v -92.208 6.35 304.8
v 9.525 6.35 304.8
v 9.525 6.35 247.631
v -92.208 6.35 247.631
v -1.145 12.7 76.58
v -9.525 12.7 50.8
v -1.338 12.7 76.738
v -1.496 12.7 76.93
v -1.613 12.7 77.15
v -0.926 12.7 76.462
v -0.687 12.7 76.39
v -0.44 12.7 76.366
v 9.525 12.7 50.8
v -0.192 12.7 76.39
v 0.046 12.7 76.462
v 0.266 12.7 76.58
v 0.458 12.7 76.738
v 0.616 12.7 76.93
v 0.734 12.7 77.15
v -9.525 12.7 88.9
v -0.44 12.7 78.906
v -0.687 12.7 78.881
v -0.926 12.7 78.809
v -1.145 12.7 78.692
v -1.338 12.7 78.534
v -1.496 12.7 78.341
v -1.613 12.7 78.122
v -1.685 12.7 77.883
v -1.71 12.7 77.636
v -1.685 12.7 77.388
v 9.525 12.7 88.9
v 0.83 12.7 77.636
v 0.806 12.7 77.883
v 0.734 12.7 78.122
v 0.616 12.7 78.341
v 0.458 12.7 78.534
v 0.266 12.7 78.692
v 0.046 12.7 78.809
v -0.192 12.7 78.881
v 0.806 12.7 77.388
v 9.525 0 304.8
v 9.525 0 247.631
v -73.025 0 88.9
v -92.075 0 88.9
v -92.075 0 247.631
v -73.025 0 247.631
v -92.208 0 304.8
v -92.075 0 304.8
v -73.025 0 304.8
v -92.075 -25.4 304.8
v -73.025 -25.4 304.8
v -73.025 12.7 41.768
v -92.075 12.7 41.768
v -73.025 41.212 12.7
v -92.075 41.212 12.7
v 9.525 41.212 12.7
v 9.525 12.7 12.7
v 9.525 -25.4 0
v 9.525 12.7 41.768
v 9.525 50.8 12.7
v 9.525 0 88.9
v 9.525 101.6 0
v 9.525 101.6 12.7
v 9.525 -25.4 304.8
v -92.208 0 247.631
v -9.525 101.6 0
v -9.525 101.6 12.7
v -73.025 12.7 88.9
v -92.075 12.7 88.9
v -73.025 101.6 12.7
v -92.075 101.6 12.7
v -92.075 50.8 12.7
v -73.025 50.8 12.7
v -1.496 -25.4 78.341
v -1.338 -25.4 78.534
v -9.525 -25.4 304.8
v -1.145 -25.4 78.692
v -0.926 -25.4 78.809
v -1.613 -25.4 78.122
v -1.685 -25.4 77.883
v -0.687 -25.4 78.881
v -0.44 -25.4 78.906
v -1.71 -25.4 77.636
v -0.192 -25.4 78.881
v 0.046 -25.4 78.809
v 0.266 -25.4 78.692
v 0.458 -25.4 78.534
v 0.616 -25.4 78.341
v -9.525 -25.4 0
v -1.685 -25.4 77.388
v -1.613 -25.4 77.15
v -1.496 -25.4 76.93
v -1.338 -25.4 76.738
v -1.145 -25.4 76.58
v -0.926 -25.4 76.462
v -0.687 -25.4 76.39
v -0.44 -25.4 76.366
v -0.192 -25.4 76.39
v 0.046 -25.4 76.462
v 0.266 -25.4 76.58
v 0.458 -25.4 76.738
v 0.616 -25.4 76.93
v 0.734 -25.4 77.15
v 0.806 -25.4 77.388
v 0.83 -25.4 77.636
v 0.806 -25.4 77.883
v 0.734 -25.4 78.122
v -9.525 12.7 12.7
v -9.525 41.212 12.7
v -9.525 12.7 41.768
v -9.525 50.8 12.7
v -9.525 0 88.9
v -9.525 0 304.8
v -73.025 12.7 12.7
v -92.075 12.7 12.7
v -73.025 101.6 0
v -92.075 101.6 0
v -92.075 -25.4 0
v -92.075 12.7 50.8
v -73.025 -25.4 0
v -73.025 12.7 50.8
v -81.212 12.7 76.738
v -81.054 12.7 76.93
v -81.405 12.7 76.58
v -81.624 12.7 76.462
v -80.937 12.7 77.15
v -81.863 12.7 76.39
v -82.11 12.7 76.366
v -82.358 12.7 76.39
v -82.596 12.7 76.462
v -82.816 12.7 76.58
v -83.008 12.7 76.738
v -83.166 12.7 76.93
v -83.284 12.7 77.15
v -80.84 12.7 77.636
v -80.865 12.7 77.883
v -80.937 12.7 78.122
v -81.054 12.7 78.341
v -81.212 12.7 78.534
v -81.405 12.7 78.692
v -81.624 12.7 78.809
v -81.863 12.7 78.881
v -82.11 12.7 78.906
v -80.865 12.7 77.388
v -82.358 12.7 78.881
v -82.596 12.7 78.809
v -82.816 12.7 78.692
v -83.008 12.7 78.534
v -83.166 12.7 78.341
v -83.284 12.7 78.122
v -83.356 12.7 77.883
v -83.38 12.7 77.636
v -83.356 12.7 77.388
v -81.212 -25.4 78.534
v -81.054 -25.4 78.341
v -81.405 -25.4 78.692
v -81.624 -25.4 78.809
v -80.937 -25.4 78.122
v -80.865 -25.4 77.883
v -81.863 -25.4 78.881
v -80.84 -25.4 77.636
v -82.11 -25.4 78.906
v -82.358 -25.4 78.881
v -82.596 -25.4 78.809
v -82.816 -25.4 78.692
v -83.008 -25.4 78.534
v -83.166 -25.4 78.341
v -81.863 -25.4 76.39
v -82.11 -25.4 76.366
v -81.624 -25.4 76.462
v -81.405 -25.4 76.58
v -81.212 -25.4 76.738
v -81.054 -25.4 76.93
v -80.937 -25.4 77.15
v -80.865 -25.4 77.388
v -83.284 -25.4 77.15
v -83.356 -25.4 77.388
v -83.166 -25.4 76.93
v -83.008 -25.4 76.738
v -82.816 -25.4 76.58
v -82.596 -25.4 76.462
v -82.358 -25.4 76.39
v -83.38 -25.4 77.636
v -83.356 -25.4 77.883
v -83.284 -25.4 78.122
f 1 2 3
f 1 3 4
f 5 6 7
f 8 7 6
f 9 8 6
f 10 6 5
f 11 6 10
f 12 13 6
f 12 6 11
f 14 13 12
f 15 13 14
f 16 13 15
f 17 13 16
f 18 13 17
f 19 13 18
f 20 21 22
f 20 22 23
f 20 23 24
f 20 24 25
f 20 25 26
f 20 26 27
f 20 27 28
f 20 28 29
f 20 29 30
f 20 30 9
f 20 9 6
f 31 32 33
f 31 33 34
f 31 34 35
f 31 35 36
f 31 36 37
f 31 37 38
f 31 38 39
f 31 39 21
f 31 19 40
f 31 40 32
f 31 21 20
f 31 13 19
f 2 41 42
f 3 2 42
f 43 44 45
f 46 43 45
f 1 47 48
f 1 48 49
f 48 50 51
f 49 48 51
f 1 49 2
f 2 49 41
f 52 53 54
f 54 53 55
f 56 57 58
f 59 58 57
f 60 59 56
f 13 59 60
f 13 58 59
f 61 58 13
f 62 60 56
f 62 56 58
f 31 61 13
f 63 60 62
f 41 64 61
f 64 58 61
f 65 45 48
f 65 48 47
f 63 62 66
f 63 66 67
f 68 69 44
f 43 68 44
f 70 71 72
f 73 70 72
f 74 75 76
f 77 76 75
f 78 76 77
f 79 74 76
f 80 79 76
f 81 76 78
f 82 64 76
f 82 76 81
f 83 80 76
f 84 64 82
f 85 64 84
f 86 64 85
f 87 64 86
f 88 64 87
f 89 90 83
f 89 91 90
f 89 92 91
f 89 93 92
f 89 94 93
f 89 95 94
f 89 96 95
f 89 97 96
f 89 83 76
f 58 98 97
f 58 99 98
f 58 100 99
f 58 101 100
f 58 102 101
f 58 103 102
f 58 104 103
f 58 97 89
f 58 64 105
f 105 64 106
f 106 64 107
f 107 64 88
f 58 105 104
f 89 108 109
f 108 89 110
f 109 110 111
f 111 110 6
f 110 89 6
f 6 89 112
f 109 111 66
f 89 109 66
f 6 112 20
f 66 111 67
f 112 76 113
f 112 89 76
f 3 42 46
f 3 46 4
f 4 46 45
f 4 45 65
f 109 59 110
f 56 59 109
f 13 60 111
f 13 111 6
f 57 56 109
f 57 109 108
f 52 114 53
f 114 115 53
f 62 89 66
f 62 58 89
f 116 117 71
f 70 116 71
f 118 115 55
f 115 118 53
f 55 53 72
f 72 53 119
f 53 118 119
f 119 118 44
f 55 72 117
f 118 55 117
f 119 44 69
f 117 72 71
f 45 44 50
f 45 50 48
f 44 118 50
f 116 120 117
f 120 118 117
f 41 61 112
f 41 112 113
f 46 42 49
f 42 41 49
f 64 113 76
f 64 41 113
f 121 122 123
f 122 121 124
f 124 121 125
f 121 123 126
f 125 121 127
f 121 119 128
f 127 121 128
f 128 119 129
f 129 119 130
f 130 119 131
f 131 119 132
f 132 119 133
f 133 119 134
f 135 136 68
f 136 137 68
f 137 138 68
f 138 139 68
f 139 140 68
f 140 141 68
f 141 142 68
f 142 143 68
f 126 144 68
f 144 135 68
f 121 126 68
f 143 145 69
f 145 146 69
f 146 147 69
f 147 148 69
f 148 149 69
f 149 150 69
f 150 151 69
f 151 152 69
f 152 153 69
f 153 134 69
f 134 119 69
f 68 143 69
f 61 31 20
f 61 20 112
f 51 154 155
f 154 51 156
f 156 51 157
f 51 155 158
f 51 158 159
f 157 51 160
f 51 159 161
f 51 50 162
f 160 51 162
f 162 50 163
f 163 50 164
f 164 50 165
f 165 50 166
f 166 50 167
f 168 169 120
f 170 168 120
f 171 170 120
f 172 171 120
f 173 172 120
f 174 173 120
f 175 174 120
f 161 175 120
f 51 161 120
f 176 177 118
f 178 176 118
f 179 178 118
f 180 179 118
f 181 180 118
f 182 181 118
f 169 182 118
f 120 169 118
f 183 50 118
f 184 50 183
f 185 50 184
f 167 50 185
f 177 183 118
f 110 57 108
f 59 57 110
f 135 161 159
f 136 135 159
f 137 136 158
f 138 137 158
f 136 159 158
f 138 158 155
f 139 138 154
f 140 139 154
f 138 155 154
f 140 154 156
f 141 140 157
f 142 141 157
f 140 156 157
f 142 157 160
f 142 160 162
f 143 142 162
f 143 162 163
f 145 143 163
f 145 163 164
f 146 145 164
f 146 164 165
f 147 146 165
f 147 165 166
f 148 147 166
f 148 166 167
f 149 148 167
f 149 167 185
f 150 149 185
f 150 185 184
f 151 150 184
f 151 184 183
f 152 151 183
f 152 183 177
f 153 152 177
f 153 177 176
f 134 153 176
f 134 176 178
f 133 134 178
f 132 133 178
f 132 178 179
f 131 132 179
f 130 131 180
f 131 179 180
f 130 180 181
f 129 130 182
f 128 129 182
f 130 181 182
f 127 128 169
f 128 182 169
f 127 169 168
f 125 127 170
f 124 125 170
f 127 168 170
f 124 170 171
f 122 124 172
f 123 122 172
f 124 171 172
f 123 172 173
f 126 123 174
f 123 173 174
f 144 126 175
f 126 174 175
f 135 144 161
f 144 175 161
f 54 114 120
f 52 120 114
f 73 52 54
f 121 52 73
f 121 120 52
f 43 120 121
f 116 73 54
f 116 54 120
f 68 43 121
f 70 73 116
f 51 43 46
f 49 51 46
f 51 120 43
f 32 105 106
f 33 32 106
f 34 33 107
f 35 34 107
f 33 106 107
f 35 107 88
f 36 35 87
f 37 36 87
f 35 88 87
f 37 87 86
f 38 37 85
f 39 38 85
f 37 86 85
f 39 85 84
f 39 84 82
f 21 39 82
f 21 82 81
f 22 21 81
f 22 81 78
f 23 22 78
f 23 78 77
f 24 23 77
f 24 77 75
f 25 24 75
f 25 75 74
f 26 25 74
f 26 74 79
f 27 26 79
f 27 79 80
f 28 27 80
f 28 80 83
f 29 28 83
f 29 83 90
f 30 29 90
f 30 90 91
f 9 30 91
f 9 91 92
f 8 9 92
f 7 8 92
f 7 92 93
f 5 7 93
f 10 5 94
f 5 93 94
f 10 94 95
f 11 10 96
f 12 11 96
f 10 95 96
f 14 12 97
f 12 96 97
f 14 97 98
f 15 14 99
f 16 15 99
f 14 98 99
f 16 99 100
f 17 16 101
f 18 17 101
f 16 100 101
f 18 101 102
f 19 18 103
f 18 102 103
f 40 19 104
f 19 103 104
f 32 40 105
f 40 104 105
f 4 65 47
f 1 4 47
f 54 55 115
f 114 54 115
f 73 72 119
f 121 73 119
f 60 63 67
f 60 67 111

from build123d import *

# Parameters (mm, degrees)
F1_DEPTH = 9.525
F5_D     = 2.54
F5_2_D   = 2.54
F6_W     = 82.682737267
F6_H     = 19.1611907959
F6_H_2   = 18.3808207512
F6_H_3   = 19.627019763
F6_W_2   = 19.05
F7_DEPTH = 6.35


with BuildPart() as f1:
    # F0 (on Right) → F1 (new body, symmetric)
    with BuildSketch(Plane.YZ):
        Polygon((-25.4, 0), (0, 0), (0, 12.7), (0, 88.9), (0, 304.8), (-25.4, 304.8), align=None)
        Polygon((0, 88.9), (0, 12.7), (12.7, 12.7), (12.7, 41.7682752013), (12.7, 50.8), (12.7, 88.9), align=None)
        Polygon((41.2119701505, 12.7), (50.8, 12.7), (12.7, 50.8), (12.7, 41.7682752013), align=None)
        Polygon((0, 12.7), (0, 0), (101.6, 0), (101.6, 12.7), (50.8, 12.7), (41.2119701505, 12.7), (12.7, 12.7), align=None)
    extrude(amount=F1_DEPTH, both=True)


with BuildPart() as f3_1:
    # F3: instance of F1
    add(f1.part.mirror(Plane(origin=(-41.275, -1.6869500415, 120.8741886465), x_dir=(0, 1, 0), z_dir=(-1, 0, 0))))

    # F5#2 (through all)
    with Locations(Plane(origin=(0, 12.7, 0), x_dir=(-1, 0, 0), z_dir=(0, 1, 0))):
        with Locations((0.4395503283, 77.6355564594), (82.1104496717, 77.6355564594)):
            Hole(F5_2_D / 2)

    # F6 (on face) → F7 (join)
    with BuildSketch(Plane(origin=(0, 0, 0), x_dir=(-1, 0, 0), z_dir=(0, 1, 0))):
        with Locations((50.8663686335, 295.2194046021)):
            Rectangle(F6_W, F6_H)
        with Locations((50.8663686335, 276.4483988285)):
            Rectangle(F6_W, F6_H_2)
        with Locations((50.8663686335, 257.4444785714)):
            Rectangle(F6_W, F6_H_3)
        with Locations((0, 295.2194046021)):
            Rectangle(F6_W_2, F6_H)
        with Locations((0, 276.4483988285)):
            Rectangle(F6_W_2, F6_H_2)
        with Locations((0, 257.4444785714)):
            Rectangle(F6_W_2, F6_H_3)
    extrude(amount=F7_DEPTH)


with BuildPart() as f1_1:
    add(f1.part)

    # F5 (through all)
    with Locations(Plane(origin=(0, 12.7, 0), x_dir=(-1, 0, 0), z_dir=(0, 1, 0))):
        with Locations((0.4395503283, 77.6355564594), (82.1104496717, 77.6355564594)):
            Hole(F5_D / 2)


solid = Compound([f3_1.part, f1_1.part])
